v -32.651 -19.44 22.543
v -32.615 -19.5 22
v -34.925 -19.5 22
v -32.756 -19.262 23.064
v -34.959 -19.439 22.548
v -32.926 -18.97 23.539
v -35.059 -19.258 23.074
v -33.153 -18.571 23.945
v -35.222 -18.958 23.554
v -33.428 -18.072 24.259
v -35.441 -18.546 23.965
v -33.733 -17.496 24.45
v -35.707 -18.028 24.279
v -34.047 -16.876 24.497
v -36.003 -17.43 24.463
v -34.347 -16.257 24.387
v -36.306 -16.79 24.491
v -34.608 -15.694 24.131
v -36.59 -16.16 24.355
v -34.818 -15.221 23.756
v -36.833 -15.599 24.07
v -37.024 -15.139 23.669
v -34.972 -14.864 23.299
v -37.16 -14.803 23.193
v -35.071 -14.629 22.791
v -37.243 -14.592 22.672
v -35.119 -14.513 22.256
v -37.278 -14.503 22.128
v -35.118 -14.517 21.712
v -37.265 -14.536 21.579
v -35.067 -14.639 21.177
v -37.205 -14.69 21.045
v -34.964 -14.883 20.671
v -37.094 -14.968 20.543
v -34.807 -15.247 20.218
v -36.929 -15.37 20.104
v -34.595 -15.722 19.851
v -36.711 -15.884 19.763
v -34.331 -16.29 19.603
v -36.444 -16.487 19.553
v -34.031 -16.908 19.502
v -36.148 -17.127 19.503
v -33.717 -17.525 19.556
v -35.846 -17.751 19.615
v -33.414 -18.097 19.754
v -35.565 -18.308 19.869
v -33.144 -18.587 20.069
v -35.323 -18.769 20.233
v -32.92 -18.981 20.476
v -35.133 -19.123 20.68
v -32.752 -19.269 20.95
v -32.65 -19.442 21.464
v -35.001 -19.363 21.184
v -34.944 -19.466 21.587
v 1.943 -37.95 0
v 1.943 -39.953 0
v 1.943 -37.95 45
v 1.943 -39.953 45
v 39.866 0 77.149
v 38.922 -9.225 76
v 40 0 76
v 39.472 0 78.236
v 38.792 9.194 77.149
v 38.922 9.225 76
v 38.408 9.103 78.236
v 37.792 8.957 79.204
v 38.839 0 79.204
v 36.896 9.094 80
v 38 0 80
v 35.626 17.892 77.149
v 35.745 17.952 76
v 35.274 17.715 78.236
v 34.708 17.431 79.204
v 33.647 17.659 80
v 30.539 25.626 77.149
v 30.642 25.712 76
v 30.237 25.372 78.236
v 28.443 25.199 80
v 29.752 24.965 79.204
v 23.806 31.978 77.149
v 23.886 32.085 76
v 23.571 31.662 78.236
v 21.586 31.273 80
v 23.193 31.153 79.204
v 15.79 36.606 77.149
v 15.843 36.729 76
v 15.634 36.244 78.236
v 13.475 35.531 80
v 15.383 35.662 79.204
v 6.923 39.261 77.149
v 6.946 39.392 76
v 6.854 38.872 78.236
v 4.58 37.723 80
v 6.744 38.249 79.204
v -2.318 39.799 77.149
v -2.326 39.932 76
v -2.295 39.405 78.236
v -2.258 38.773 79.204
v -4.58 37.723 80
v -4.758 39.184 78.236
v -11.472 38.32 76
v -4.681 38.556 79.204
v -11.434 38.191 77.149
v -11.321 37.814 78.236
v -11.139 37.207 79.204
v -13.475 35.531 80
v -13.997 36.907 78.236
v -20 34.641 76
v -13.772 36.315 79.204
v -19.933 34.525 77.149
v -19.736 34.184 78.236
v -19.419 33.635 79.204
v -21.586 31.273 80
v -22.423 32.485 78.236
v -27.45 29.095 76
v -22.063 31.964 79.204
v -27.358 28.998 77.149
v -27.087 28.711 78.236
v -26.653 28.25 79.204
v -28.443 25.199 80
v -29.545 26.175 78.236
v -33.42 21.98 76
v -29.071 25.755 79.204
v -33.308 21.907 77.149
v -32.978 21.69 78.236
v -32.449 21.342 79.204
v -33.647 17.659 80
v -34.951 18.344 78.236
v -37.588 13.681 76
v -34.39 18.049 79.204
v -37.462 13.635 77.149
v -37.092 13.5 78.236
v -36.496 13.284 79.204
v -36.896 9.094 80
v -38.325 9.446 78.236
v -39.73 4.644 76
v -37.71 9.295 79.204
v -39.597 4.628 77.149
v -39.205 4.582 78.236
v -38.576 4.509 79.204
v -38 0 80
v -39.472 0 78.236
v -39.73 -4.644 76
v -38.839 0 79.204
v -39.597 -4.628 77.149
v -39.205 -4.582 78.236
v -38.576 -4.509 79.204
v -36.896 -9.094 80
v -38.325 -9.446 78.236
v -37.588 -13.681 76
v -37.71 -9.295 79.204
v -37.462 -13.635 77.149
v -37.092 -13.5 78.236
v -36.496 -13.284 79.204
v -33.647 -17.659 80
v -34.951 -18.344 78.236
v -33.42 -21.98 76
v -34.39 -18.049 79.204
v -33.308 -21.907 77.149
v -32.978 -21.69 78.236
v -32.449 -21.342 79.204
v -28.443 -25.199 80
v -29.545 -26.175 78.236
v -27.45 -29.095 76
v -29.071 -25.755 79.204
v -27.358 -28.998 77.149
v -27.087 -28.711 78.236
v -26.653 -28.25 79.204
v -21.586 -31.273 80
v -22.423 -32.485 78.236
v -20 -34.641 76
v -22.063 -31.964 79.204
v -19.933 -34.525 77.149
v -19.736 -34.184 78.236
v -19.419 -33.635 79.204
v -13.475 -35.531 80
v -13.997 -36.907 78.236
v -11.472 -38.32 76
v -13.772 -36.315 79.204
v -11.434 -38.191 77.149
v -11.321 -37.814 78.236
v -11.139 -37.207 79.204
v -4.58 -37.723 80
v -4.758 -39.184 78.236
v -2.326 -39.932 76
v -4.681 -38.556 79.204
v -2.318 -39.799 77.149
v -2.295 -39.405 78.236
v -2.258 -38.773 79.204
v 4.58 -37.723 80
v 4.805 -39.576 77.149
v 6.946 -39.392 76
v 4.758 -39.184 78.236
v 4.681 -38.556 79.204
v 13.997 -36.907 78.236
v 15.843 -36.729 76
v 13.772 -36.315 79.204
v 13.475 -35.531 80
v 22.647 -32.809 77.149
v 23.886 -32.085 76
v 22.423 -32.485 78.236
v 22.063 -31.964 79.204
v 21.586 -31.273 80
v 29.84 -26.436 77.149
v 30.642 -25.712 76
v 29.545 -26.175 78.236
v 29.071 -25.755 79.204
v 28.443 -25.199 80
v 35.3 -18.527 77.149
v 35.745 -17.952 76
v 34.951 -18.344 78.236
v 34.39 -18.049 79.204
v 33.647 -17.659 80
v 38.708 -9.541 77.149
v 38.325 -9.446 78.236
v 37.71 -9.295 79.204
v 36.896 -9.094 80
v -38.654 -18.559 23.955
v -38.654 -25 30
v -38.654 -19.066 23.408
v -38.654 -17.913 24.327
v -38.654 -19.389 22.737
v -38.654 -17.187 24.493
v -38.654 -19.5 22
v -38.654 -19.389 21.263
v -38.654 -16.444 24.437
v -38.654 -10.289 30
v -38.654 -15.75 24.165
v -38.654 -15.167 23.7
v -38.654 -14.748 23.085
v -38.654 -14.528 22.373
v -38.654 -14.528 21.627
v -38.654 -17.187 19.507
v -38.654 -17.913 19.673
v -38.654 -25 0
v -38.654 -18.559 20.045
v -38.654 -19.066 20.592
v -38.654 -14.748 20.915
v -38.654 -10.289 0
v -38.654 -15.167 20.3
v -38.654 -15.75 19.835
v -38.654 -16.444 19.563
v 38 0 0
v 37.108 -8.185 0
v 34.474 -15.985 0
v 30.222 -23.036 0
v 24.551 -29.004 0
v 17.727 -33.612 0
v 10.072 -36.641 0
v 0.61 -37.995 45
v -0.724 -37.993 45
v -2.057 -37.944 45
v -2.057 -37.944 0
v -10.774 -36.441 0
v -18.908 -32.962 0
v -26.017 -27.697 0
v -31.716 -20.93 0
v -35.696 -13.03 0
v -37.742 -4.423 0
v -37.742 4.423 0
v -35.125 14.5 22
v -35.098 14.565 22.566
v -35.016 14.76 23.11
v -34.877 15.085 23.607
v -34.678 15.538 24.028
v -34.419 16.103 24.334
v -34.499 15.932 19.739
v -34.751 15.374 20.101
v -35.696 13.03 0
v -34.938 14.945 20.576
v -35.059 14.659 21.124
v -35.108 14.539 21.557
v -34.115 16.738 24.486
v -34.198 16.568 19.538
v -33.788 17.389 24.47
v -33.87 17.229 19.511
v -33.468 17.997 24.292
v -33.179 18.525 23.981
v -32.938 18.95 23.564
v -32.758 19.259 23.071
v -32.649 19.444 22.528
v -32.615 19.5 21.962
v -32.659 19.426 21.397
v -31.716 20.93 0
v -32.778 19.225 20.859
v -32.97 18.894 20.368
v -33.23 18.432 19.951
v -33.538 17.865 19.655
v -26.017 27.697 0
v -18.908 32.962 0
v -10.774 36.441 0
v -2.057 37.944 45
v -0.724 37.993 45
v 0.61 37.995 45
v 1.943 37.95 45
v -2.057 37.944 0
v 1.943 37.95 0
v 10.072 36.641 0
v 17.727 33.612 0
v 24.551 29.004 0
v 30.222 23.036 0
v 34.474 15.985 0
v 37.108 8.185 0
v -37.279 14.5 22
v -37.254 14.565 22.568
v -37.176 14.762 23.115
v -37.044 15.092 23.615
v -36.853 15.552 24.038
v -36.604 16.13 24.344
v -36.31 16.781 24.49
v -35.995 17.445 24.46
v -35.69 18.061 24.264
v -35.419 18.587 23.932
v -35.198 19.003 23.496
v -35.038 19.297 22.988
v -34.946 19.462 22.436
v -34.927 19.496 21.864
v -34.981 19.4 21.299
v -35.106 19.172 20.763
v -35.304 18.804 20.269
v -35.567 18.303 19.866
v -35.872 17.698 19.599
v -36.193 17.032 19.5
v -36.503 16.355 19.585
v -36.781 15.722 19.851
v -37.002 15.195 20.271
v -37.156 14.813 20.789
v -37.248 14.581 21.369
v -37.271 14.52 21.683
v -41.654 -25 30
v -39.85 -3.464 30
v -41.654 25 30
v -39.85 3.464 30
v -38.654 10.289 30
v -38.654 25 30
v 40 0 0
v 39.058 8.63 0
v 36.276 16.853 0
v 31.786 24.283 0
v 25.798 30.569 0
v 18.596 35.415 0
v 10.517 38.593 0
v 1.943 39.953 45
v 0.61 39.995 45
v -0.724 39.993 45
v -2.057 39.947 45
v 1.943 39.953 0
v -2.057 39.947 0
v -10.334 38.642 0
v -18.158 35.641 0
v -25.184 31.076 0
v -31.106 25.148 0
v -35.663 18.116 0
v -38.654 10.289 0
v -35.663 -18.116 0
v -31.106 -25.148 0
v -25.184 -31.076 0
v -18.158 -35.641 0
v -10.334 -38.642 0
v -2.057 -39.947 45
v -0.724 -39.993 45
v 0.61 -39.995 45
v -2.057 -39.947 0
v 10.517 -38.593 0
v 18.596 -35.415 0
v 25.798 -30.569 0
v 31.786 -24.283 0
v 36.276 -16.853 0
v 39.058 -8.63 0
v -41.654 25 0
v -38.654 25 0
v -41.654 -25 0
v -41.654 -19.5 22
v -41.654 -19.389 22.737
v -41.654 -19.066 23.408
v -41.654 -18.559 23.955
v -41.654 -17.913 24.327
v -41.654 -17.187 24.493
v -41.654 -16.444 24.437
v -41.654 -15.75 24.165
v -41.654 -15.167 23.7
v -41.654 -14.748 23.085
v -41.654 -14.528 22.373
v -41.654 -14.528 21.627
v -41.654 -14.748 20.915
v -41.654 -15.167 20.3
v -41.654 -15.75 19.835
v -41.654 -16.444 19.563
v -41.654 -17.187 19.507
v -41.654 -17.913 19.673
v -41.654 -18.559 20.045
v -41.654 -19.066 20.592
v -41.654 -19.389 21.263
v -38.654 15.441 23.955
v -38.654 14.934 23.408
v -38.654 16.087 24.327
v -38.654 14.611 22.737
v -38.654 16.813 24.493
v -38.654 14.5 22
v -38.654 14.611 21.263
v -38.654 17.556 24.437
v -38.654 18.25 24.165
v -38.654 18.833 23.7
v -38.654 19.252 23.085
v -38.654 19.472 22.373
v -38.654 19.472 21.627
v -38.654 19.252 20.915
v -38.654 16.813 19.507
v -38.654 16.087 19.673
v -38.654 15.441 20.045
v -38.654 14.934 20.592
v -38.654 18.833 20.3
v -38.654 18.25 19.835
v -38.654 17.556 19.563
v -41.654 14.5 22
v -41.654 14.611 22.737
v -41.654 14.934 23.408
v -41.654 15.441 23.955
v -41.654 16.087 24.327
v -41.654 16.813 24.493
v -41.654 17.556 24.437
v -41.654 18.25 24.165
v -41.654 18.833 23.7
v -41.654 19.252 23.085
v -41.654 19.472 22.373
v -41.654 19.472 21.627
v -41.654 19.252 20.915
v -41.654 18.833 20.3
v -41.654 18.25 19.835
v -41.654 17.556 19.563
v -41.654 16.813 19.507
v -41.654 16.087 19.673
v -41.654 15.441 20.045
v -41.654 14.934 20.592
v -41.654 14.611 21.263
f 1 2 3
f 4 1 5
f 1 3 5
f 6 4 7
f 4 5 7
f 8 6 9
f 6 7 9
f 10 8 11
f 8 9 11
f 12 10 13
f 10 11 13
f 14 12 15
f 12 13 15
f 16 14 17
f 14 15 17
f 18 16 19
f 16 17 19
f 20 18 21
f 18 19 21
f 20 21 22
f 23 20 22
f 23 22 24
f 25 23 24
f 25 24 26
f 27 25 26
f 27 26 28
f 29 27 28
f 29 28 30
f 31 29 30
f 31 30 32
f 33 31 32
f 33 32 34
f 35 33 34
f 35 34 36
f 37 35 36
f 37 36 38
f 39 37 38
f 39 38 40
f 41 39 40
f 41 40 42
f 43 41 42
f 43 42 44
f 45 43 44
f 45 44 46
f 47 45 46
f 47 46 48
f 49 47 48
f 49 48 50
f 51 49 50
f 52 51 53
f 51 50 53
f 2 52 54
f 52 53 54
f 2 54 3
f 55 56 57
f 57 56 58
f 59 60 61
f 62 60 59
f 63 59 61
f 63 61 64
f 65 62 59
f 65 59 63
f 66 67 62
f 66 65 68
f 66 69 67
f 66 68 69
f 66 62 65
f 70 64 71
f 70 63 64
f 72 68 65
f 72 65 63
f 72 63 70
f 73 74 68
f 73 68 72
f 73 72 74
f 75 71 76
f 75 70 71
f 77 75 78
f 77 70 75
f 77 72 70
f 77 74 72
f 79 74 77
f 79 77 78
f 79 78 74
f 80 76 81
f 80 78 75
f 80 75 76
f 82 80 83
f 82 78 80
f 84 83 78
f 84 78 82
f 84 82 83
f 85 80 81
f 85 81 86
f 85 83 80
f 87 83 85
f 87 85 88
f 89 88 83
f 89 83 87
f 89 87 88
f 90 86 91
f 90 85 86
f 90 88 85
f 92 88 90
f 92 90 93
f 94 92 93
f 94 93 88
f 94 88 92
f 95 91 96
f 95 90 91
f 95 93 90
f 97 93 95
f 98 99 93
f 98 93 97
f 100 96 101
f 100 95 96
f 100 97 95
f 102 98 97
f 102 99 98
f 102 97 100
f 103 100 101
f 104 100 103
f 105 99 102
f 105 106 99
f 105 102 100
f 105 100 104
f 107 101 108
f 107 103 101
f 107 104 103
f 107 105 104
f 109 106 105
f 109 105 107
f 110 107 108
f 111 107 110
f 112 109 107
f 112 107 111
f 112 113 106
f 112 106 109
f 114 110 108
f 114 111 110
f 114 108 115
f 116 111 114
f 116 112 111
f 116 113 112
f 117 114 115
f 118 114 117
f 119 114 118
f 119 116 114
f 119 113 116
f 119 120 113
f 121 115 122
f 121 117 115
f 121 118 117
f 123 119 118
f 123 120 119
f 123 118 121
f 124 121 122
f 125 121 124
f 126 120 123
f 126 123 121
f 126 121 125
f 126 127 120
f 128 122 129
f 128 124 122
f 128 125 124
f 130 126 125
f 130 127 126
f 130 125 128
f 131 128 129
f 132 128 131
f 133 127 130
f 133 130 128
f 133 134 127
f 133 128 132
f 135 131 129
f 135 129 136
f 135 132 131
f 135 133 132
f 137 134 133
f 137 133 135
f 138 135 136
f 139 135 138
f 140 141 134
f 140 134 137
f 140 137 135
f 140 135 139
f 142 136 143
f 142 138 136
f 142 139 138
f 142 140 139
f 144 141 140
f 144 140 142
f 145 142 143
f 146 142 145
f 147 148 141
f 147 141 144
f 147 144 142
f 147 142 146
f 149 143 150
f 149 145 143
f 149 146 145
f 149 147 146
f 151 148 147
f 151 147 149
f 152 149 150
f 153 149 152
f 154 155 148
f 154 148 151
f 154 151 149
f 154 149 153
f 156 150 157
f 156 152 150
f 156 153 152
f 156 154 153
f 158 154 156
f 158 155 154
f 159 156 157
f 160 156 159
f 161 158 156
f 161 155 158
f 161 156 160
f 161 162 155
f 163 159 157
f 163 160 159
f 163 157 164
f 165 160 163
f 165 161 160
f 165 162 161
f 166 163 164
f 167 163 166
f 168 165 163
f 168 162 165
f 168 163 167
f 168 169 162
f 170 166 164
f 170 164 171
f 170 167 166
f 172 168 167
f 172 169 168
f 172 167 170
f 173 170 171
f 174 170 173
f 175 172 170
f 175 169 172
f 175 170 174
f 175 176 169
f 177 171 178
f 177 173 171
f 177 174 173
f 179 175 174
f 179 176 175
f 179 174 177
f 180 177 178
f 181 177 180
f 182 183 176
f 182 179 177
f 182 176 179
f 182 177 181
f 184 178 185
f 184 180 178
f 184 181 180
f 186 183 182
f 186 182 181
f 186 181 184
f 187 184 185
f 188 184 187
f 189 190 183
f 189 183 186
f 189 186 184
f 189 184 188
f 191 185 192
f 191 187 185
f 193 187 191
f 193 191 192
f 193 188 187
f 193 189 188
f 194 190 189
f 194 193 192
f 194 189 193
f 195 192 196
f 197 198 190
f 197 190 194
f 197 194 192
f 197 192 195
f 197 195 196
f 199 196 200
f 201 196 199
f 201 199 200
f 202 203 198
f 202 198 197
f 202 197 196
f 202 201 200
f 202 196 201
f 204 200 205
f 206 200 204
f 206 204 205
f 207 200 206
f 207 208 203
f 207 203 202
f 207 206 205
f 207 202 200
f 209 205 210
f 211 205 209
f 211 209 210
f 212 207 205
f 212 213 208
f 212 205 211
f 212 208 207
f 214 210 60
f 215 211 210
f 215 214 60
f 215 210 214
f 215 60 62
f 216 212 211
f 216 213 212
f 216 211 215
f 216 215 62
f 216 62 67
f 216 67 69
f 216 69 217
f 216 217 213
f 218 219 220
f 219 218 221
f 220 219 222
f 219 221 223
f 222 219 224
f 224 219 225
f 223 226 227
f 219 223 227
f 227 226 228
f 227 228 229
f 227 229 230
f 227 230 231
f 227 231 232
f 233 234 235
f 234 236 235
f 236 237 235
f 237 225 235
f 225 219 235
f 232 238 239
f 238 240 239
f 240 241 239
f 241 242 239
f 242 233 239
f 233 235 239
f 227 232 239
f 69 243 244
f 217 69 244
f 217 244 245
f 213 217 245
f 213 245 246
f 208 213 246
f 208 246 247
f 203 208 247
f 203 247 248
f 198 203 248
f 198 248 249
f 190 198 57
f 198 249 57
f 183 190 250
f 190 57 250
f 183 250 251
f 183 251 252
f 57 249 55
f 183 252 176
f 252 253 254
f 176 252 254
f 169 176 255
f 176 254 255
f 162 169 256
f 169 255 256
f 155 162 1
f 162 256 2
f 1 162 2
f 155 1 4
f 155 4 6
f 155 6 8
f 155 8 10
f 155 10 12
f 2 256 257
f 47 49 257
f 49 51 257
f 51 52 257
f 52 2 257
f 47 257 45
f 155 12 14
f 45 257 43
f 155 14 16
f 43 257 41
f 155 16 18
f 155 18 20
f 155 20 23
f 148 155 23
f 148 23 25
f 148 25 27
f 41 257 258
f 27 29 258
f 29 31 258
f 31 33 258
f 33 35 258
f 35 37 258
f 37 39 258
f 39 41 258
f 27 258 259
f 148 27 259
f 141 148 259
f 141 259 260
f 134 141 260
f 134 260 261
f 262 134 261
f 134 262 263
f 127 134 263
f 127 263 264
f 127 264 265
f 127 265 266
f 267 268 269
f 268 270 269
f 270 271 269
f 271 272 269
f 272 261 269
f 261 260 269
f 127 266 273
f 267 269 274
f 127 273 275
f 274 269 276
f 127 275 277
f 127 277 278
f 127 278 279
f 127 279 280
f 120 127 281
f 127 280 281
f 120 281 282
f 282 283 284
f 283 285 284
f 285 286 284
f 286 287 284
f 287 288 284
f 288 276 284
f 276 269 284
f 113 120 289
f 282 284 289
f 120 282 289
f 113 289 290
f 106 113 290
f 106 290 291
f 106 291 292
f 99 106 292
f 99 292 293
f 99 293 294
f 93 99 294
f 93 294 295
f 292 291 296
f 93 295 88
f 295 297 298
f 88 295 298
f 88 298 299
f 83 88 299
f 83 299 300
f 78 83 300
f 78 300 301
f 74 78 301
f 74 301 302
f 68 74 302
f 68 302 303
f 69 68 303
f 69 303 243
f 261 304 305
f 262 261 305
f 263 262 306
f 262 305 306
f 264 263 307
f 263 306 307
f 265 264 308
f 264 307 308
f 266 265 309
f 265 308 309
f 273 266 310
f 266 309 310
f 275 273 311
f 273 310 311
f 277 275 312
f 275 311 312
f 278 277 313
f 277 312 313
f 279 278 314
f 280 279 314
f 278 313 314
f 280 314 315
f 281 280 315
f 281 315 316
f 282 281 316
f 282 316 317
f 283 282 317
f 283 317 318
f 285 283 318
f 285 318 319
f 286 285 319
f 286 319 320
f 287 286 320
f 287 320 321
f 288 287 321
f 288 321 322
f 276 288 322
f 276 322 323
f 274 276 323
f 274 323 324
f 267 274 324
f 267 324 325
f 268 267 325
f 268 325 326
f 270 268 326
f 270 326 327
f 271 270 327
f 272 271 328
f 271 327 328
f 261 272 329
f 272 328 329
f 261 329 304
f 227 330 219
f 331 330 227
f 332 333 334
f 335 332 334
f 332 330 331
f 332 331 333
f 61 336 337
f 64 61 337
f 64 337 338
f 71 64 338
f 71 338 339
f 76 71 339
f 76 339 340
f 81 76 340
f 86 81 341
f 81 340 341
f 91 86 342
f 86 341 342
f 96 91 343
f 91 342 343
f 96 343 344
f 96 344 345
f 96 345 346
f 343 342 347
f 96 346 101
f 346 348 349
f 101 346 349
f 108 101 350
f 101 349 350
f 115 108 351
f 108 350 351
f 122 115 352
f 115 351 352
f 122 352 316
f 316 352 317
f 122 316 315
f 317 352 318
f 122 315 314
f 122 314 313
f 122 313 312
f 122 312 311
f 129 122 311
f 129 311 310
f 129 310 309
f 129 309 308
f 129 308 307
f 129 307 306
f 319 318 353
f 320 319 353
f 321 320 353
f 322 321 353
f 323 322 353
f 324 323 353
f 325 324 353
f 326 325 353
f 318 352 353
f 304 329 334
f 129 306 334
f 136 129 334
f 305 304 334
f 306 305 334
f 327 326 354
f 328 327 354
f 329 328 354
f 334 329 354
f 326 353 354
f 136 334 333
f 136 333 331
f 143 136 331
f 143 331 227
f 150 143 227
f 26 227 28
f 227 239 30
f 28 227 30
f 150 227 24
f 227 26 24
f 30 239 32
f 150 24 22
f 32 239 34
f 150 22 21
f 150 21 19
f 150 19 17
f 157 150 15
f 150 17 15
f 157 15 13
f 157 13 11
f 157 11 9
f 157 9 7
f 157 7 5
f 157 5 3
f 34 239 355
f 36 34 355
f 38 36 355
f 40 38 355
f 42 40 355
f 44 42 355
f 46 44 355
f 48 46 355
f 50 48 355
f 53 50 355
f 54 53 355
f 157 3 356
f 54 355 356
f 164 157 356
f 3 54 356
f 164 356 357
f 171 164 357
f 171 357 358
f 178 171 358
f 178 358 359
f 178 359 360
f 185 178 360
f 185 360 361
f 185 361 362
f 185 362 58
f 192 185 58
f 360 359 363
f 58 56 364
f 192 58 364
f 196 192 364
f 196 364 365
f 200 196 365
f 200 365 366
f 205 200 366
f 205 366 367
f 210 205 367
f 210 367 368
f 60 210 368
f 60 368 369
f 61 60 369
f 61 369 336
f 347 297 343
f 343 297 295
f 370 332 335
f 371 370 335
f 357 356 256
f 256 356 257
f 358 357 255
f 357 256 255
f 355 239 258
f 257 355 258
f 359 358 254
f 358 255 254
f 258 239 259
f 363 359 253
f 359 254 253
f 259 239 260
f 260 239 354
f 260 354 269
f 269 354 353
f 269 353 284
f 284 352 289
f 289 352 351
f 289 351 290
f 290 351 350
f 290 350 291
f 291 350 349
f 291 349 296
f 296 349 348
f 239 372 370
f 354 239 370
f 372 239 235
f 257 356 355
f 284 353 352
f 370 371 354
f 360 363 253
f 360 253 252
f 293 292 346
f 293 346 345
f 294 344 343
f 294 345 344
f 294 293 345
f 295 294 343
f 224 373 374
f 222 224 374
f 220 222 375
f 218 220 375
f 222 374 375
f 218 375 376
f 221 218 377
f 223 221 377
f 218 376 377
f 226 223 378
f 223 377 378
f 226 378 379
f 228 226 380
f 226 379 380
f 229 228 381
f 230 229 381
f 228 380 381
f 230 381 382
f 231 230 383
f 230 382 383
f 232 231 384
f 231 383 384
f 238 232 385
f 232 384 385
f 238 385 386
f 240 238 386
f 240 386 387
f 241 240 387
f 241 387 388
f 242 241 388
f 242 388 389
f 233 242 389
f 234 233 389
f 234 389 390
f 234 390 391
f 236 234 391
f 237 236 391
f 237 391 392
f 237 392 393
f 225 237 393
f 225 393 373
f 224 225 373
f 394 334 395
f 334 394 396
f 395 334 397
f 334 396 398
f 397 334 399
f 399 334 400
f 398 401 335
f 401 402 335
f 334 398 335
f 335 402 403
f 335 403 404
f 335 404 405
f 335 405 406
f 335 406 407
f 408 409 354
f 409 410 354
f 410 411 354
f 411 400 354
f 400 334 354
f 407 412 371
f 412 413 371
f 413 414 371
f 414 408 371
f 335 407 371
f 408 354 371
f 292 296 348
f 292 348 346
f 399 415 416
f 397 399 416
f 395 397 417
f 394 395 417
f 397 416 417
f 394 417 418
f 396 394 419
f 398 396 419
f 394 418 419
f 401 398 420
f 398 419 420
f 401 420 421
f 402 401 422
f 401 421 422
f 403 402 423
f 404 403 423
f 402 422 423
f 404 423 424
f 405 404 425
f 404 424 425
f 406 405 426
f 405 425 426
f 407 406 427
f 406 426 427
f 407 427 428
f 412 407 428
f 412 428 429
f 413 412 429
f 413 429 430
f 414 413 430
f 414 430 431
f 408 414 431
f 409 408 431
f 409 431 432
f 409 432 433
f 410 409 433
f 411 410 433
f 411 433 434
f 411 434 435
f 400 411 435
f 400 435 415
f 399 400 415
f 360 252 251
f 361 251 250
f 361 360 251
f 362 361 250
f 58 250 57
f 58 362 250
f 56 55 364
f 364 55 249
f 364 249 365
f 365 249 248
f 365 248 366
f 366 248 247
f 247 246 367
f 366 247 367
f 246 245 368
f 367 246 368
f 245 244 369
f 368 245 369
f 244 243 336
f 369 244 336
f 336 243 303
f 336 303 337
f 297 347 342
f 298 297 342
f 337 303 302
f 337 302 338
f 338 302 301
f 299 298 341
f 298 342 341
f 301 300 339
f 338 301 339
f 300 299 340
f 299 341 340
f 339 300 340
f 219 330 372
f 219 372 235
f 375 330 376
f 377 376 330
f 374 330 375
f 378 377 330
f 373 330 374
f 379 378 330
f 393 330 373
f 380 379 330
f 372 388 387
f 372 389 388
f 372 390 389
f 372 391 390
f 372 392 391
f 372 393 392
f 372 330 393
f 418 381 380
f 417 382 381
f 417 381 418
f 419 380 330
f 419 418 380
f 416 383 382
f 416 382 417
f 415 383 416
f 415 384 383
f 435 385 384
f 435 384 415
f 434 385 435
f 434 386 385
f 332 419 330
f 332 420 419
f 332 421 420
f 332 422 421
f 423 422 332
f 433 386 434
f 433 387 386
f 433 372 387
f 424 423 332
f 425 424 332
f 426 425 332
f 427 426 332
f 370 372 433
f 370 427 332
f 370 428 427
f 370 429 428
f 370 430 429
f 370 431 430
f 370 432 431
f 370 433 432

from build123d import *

# Parameters (mm, degrees)
F0_R      = 40
F1_DEPTH  = 80
F2_R      = 38
F3_DEPTH  = 90
F5_W      = 4
F5_H      = 45
F6_DEPTH  = 40
F7_W      = 3
F7_H      = 50
F8_DEPTH  = 30
F9_R      = 2.5
F10_DEPTH = 30


# Not quite as in the source:
# - a fillet or chamfer that OpenCascade refuses, or shapes differently, is made with other operations: its cross-section is extruded or revolved along the edge and cut away or added


with BuildPart() as f1:
    # F0 (on Top) → F1 (new body)
    with BuildSketch(Plane.XY):
        Circle(F0_R)
    extrude(amount=F1_DEPTH)

    # F2 (on face) → F3 (cut)
    with BuildSketch(Plane(origin=(0, 0, 0), x_dir=(1, 0, 0), z_dir=(0, 0, -1))):
        Circle(F2_R)
    extrude(amount=-F3_DEPTH, mode=Mode.SUBTRACT)

    # F4: fillet of radius 5 on 1 edges, made by hand

    # F4_s1 → F4_t2 (revolve, cut)
    with BuildSketch(Plane.XZ):
        with BuildLine():
            ThreePointArc((40, 76), (39.472135955, 78.2360679775), (38, 80))
            Line((38, 80), (40, 80))
            Line((40, 80), (40, 76))
        make_face()
    revolve(axis=Axis((0, 0, 80), (0, 0, 1)), mode=Mode.SUBTRACT)

    # F5 (on Front) → F6 (cut, symmetric)
    with BuildSketch(Plane.XZ):
        with Locations((-0.0568005547, 22.5)):
            Rectangle(F5_W, F5_H)
    extrude(amount=F6_DEPTH, both=True, mode=Mode.SUBTRACT)

    # F7 (on Top) → F8 (join)
    with BuildSketch(Plane.XY):
        with Locations((-40.154192288, 0)):
            Rectangle(F7_W, F7_H)
    extrude(amount=F8_DEPTH)

    # F9 (on face) → F10 (cut)
    with BuildSketch(Plane(origin=(-41.654192288, 0, 0), x_dir=(0, -1, 0), z_dir=(-1, 0, 0))):
        with Locations((-17, 22)):
            Circle(F9_R)
        with Locations((17, 22)):
            Circle(F9_R)
    extrude(amount=-F10_DEPTH, mode=Mode.SUBTRACT)


solid = f1.part
